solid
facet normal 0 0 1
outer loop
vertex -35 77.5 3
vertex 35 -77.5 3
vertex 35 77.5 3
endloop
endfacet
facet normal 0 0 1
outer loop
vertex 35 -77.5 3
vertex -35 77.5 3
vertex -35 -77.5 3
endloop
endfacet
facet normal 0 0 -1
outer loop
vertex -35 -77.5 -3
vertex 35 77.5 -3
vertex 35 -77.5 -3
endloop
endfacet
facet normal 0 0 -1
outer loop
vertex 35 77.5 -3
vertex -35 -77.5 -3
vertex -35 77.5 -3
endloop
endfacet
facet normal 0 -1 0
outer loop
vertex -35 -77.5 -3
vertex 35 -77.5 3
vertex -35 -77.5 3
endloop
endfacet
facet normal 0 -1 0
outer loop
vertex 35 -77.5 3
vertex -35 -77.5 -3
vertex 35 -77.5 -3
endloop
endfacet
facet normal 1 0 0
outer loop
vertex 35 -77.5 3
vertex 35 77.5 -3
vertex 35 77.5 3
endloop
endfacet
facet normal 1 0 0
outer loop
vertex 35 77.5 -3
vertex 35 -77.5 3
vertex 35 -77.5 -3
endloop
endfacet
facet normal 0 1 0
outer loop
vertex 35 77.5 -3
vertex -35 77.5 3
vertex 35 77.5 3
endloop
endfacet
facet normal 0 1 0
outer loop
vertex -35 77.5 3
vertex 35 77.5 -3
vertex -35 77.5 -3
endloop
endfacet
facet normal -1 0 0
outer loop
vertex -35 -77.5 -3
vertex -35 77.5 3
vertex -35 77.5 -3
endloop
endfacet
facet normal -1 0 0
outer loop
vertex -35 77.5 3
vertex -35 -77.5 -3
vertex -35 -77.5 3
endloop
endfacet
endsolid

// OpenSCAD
// ========================================
// a plate 70 mm wide 155 mm deep and 6 mm thick
// NeuroCAD canonical IR; dimensions are millimetres
// ========================================
$fn = 48;

cube(size=[70, 155, 6], center=true);
